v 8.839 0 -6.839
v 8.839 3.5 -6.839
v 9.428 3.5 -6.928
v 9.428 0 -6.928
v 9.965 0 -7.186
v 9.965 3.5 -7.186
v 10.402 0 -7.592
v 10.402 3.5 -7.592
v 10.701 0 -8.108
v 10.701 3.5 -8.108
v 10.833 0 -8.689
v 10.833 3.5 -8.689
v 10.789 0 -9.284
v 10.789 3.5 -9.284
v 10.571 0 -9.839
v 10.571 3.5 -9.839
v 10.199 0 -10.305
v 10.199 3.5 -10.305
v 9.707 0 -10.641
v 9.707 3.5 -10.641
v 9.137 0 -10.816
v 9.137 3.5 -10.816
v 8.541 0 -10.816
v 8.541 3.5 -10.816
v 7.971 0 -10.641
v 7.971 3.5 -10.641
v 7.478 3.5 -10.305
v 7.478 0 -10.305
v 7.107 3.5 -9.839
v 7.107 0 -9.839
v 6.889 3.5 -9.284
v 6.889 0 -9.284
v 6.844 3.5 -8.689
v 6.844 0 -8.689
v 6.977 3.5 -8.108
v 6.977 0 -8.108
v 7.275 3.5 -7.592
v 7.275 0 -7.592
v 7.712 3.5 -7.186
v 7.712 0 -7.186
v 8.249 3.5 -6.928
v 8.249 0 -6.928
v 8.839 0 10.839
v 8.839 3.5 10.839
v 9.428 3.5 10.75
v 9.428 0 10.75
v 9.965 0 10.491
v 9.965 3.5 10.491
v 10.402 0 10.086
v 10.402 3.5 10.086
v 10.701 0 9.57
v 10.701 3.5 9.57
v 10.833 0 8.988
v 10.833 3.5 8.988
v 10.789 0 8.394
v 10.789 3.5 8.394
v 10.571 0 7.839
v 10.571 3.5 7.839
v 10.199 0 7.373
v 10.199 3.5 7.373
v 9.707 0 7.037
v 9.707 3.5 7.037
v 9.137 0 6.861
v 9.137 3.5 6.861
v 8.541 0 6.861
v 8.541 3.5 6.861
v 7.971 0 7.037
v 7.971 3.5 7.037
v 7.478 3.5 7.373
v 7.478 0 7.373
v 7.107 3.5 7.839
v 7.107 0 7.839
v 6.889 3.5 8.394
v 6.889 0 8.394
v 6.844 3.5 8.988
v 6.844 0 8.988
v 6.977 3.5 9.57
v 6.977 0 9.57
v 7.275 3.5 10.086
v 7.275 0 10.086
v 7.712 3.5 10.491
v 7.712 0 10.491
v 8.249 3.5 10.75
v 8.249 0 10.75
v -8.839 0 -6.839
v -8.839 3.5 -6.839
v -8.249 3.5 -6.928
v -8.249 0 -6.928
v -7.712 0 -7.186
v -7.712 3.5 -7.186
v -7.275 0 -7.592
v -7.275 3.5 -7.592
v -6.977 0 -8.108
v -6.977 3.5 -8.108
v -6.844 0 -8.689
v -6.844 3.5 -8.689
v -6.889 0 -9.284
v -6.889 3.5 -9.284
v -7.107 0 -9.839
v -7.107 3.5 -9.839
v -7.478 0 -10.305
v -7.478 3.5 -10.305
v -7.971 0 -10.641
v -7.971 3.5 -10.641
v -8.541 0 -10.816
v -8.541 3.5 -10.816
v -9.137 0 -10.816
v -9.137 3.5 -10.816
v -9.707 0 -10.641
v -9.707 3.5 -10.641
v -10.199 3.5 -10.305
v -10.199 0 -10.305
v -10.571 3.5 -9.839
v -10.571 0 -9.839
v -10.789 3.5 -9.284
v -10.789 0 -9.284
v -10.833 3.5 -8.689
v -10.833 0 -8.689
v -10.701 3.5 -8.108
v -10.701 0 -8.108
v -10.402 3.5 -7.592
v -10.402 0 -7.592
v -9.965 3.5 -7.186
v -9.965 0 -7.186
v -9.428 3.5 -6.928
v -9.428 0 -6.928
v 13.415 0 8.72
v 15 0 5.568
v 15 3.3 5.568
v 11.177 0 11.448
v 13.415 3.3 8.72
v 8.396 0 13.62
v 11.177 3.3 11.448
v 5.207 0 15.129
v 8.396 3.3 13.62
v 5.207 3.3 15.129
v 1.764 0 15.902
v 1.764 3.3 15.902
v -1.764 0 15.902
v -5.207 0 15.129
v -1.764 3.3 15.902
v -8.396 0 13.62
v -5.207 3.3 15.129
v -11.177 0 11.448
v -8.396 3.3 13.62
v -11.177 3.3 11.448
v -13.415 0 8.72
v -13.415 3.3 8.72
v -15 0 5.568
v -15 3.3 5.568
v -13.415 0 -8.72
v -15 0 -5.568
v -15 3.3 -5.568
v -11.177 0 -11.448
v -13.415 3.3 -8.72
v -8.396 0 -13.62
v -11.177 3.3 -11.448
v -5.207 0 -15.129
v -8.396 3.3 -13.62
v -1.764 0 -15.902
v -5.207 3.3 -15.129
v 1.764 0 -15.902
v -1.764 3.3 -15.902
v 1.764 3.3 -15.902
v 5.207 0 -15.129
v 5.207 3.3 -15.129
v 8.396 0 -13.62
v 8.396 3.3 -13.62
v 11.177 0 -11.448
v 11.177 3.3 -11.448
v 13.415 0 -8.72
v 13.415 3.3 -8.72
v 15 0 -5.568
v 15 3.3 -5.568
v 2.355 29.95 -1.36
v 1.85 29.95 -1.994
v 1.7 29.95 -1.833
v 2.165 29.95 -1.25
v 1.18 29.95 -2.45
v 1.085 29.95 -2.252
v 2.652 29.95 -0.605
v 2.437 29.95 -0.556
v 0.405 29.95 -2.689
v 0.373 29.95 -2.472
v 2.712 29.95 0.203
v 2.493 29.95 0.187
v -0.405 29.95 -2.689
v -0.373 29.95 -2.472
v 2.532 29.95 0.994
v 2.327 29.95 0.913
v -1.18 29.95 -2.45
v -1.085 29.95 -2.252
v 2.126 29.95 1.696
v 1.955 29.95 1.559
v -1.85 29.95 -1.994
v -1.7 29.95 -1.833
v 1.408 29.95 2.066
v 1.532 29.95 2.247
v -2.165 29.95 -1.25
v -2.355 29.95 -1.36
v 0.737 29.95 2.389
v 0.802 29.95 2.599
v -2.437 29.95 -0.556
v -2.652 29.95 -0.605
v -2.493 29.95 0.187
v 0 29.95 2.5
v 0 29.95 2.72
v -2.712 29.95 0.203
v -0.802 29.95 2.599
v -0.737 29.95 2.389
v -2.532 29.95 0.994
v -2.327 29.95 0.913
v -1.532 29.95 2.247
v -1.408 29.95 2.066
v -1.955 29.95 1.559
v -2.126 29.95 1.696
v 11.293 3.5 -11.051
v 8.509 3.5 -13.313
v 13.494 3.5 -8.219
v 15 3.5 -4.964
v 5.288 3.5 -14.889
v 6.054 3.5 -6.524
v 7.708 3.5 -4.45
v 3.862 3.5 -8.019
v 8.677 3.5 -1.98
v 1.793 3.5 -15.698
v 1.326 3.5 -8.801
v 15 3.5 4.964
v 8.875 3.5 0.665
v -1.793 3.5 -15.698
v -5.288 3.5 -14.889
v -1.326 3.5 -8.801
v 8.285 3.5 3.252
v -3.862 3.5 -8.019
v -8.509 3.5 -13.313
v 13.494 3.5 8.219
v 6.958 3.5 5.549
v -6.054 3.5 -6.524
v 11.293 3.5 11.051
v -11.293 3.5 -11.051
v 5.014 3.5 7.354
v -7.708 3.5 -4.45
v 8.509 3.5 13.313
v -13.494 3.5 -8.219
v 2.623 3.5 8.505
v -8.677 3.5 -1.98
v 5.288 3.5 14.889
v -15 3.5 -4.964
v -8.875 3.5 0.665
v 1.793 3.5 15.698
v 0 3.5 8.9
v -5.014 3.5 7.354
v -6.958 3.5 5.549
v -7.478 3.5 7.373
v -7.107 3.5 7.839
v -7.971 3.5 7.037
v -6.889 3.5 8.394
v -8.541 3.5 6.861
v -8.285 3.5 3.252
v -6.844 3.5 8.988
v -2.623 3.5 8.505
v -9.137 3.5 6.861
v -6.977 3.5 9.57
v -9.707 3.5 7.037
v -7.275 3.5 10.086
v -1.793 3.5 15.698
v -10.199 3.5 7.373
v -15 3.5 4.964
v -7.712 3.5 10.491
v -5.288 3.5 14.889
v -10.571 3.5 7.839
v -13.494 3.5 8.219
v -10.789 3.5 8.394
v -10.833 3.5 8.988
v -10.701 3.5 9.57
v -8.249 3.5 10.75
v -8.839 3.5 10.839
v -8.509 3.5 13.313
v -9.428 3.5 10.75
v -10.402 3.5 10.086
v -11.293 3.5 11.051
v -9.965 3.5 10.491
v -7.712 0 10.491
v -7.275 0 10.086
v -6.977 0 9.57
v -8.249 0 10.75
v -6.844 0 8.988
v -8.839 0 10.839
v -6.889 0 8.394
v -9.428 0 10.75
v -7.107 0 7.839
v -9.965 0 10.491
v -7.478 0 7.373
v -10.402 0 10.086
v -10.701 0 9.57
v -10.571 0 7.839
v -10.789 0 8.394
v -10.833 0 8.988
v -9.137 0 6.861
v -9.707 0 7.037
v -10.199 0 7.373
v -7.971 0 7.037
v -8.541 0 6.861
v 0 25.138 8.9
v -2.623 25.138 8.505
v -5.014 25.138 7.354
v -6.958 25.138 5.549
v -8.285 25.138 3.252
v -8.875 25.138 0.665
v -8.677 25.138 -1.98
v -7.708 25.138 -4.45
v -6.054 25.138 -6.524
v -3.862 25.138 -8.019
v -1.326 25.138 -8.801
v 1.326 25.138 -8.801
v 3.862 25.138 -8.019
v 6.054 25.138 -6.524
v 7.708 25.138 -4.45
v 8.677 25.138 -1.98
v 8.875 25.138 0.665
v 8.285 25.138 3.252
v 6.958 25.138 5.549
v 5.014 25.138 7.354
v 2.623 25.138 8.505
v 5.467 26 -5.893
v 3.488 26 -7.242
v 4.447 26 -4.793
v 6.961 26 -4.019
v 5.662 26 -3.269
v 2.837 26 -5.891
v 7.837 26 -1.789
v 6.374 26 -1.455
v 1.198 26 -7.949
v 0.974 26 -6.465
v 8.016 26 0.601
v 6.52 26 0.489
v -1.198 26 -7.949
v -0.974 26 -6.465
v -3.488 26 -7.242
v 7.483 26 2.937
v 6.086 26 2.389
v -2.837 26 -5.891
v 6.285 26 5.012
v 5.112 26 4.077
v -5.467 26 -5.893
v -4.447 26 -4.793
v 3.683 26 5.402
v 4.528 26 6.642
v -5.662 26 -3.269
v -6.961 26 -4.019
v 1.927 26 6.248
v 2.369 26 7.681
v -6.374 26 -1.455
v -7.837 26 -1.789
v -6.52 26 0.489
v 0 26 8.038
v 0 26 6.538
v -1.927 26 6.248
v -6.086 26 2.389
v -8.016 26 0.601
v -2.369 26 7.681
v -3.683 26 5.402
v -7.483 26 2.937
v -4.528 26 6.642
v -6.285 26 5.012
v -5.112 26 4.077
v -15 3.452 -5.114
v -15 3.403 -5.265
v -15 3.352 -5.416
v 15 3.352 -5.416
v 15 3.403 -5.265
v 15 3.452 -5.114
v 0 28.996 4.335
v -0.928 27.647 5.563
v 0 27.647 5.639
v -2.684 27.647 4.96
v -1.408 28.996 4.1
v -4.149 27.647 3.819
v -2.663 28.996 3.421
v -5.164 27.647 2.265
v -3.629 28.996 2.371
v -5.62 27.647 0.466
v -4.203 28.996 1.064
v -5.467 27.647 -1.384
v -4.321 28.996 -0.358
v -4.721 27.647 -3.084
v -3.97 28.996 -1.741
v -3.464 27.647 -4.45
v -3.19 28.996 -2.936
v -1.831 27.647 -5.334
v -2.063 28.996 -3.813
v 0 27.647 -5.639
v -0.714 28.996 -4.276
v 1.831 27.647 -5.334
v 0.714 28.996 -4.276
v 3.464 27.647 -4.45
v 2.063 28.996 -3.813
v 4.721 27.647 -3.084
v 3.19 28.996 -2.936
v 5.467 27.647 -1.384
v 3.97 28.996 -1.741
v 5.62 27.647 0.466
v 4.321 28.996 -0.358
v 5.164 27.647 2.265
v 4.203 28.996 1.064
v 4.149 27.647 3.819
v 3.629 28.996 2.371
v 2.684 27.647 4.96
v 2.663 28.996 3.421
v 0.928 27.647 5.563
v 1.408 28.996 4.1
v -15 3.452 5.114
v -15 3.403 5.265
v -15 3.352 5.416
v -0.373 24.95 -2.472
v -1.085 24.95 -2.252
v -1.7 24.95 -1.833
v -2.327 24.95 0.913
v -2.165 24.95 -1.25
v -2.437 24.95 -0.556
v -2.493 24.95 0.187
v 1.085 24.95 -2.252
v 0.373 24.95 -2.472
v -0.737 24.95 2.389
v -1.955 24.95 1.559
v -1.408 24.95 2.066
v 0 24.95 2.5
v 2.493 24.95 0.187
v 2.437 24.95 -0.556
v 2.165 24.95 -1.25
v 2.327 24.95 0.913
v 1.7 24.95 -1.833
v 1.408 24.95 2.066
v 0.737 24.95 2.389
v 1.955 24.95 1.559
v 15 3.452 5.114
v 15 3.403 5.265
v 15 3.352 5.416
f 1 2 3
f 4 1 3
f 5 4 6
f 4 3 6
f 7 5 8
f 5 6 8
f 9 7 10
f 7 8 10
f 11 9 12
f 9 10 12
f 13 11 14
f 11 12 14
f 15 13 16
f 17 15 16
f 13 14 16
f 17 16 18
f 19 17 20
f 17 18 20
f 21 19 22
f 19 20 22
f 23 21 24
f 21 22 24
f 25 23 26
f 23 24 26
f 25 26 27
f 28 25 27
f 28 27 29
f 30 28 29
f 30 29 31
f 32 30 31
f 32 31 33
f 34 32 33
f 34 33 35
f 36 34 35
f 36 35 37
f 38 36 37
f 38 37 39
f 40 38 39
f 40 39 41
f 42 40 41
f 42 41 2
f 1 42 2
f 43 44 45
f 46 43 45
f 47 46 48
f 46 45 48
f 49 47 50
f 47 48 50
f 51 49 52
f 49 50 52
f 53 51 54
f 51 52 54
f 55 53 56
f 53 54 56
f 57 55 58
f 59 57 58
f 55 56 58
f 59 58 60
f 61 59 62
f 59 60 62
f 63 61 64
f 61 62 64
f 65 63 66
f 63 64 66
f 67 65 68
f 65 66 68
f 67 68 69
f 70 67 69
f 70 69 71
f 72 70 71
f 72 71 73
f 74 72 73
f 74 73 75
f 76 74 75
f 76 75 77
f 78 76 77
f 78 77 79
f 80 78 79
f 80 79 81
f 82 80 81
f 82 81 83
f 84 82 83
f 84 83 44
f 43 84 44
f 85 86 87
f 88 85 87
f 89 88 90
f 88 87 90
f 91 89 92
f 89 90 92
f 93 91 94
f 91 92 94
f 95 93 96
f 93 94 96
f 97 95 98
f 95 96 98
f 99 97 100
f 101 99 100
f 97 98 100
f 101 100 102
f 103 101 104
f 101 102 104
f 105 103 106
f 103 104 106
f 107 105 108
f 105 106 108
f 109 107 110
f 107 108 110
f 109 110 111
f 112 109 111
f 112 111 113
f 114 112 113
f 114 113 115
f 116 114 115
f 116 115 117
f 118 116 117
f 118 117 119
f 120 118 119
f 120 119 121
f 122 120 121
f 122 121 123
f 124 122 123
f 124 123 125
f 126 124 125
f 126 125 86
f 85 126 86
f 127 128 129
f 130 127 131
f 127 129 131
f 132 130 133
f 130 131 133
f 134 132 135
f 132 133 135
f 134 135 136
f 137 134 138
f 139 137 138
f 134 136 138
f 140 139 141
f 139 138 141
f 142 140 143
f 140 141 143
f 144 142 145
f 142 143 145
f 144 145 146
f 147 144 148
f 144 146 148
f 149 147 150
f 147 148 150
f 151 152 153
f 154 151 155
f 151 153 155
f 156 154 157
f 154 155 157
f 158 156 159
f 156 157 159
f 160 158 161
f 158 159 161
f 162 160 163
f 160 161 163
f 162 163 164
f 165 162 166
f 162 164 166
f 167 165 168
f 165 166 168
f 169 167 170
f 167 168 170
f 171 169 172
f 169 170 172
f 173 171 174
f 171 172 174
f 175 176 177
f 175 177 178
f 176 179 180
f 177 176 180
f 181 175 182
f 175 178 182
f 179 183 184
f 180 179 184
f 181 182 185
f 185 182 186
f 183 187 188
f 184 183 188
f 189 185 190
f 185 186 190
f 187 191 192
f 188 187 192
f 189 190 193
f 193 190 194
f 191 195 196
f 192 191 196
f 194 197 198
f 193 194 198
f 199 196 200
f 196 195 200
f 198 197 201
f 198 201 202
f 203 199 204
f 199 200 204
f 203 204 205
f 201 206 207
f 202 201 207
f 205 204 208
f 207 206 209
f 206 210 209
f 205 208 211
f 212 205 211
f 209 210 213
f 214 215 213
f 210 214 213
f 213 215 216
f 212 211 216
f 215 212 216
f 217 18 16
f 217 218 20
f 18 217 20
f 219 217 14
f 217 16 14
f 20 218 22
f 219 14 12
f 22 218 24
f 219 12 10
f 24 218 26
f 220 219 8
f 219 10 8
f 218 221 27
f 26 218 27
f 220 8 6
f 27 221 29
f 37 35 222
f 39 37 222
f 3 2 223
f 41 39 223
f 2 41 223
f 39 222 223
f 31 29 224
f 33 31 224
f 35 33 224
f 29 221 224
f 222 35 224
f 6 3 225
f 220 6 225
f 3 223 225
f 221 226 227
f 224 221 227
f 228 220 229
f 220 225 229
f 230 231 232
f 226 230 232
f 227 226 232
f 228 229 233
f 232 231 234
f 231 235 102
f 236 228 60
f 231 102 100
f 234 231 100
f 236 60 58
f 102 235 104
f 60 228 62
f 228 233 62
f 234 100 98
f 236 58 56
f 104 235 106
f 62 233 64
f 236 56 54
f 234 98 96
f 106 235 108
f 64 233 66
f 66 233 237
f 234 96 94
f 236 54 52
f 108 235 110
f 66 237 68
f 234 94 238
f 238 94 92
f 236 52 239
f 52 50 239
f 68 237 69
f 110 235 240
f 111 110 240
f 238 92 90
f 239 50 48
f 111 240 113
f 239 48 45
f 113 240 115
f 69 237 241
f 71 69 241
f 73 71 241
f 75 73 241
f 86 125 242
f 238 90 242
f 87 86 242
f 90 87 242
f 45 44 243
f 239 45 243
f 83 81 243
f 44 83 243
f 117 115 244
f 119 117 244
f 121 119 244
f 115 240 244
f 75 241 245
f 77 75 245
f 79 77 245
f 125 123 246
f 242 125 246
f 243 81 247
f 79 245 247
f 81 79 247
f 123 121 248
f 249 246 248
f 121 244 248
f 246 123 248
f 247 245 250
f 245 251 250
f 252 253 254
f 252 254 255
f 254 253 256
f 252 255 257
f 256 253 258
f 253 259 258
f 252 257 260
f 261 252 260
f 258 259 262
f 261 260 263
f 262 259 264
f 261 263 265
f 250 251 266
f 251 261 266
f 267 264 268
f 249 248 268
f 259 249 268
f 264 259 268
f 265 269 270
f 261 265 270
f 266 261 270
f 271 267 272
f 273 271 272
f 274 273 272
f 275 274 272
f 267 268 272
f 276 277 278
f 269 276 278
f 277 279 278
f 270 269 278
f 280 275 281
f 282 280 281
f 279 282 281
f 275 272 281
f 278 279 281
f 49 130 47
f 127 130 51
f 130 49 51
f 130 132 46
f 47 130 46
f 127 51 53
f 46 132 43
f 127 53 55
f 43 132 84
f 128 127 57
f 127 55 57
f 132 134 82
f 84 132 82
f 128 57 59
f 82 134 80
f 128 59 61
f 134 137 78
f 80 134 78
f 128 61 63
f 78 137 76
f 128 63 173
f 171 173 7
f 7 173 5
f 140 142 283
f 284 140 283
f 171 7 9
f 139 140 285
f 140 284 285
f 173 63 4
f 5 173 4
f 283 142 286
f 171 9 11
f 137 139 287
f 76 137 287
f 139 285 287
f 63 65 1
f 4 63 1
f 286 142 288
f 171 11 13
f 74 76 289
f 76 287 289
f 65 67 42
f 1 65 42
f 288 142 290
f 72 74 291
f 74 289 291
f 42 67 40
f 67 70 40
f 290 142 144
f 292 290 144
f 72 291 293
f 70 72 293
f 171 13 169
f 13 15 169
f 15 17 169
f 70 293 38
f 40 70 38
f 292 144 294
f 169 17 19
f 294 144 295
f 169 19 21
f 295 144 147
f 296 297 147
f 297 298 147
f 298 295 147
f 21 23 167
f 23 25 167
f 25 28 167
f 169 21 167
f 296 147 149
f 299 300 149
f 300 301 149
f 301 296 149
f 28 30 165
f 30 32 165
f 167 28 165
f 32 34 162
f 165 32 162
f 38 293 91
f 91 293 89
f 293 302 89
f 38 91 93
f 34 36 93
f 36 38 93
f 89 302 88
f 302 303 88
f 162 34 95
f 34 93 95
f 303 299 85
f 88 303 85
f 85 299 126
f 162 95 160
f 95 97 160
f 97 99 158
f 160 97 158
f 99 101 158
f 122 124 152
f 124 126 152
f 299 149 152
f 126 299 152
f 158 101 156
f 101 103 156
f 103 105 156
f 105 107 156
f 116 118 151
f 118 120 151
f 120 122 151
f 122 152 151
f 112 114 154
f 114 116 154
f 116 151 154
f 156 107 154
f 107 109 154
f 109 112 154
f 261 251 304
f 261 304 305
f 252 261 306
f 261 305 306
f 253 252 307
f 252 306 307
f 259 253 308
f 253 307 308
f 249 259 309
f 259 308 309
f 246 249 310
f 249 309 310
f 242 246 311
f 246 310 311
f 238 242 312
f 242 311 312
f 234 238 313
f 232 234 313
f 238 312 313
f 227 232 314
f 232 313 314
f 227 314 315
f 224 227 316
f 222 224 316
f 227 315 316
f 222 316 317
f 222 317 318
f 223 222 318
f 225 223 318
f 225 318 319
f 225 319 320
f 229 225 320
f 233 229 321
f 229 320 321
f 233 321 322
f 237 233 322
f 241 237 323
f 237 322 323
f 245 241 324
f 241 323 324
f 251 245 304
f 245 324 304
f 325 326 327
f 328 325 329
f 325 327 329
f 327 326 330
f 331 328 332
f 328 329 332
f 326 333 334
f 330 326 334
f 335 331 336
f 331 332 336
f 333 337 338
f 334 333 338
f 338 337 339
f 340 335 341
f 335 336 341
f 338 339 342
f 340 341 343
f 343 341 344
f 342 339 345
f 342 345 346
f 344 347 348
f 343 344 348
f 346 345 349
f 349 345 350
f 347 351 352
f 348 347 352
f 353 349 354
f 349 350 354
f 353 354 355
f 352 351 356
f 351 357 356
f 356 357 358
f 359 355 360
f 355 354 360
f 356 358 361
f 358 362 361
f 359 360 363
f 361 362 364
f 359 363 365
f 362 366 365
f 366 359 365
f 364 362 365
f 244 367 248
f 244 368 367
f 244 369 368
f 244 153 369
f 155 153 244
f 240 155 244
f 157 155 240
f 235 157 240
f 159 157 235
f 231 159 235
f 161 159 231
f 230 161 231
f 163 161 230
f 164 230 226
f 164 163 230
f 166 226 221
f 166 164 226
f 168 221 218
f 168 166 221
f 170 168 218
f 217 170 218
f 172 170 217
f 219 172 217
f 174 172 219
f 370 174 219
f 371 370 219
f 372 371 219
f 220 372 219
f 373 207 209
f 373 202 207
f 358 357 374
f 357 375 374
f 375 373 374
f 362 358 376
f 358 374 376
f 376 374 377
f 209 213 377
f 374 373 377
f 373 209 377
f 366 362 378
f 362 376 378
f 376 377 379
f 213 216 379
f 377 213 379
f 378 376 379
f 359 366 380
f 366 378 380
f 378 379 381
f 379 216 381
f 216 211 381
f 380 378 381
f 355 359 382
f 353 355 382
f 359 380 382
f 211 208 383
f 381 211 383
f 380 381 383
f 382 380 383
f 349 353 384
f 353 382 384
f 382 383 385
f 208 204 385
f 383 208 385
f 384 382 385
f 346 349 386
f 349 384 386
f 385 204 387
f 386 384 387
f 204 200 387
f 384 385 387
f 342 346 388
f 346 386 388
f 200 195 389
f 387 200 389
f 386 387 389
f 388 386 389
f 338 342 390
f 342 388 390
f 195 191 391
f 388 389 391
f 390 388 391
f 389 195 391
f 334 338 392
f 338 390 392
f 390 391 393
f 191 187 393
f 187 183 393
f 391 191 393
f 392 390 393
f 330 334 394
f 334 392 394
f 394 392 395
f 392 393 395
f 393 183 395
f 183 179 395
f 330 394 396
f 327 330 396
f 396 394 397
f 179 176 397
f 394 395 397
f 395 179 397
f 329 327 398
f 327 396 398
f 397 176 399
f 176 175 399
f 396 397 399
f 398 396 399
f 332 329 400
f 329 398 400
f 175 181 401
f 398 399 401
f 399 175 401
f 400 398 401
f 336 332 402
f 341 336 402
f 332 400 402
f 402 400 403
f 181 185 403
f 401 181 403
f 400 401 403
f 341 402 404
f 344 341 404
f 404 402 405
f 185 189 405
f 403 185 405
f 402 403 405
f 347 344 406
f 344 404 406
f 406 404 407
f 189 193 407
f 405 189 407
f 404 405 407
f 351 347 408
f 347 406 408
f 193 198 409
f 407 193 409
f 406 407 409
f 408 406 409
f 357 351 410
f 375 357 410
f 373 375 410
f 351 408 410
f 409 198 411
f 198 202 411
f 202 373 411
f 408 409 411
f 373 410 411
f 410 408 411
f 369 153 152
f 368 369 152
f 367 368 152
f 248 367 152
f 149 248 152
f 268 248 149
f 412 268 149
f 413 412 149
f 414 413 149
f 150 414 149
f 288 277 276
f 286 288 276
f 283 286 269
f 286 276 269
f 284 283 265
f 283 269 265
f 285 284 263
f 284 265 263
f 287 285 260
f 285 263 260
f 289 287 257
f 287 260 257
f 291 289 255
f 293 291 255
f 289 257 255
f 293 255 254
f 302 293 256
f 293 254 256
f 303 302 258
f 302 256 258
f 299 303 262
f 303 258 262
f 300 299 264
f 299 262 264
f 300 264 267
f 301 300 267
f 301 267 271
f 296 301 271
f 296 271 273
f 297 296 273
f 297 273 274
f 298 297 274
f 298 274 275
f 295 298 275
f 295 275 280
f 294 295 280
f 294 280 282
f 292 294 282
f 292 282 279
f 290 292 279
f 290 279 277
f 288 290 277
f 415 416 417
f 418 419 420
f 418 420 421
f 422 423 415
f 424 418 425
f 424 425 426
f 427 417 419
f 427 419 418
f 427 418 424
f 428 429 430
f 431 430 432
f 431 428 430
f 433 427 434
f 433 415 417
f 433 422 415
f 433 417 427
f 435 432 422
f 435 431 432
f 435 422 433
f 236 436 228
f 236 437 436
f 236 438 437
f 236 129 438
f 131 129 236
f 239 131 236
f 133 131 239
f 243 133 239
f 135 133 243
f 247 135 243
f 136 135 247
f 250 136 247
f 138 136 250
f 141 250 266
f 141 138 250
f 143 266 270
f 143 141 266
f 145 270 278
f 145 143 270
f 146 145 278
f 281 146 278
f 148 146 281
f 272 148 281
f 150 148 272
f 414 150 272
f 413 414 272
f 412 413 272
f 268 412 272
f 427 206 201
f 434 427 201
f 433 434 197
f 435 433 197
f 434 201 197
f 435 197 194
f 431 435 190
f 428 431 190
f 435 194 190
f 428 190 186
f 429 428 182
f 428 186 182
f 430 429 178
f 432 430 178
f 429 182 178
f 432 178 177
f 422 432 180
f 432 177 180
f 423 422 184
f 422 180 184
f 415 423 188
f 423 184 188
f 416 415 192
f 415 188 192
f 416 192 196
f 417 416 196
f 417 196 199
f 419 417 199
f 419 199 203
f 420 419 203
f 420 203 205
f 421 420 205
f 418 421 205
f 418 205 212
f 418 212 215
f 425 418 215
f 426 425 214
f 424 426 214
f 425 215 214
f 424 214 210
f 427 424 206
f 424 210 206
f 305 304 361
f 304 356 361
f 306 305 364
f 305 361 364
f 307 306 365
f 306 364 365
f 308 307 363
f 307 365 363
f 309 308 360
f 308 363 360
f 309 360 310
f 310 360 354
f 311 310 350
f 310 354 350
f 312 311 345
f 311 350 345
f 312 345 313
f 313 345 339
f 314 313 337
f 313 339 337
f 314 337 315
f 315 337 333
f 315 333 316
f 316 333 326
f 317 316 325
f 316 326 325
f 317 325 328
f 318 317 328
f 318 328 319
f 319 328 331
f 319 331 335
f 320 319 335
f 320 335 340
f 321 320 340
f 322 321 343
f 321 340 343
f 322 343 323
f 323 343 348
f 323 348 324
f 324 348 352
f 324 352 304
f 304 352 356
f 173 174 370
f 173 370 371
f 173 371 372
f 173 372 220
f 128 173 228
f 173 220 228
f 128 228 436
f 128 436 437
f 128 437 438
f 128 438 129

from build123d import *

# Parameters (mm, degrees)
SKETCH_2_R          = 2.5
CUT_EXTRUDE_1_DEPTH = 5
SKETCH_3_R          = 2
CUT_EXTRUDE_2_DEPTH = 5
CHAMFER_1_SIZE      = 0.2


with BuildPart() as part:
    # 草图1 → 旋转1 (revolve)
    with BuildSketch(Plane.XY, mode=Mode.PRIVATE) as revolve_1_sk:
        with BuildLine():
            Line((0, 0), (16, 0))
            Line((16, 0), (16, 3.5))
            Line((16, 3.5), (8.9, 3.5))
            Line((8.9, 3.5), (8.9, 25.138348415))
            Line((8.9, 25.138348415), (8.038348415, 26))
            Line((8.038348415, 26), (6.538348415, 26))
            ThreePointArc((6.538348415, 26), (5.032803689, 28.365273582), (2.719834554, 29.95))
            Line((2.719834554, 29.95), (0, 29.95))
            Line((0, 29.95), (0, 0))
        make_face()
    revolve(revolve_1_sk.sketch.rotate(Axis((0, 33.582842794, 0), (0, -1, 0)), 90), axis=Axis((0, 33.582842794, 0), (0, -1, 0)))

    # 草图2 → 切除-拉伸1 (cut)
    with BuildSketch(Plane(origin=(0, 29.95, 0), x_dir=(1, 0, 0), z_dir=(0, 1, 0))):
        with Locations(Location((0, 0, 0), (0, 0, 270))):
            Circle(SKETCH_2_R)
    extrude(amount=-CUT_EXTRUDE_1_DEPTH, mode=Mode.SUBTRACT)

    # 草图3 → 切除-拉伸2 (cut)
    with BuildSketch(Plane(origin=(0, 3.5, 0), x_dir=(1, 0, 0), z_dir=(0, 1, 0))):
        with Locations(Location((8.838834765, 8.838834765, 0), (0, 0, 270))):
            Circle(SKETCH_3_R)
        with Locations(Location((8.838834765, -8.838834765, 0), (0, 0, 270))):
            Circle(SKETCH_3_R)
        with Locations(Location((-8.838834765, -8.838834765, 0), (0, 0, 270))):
            Circle(SKETCH_3_R)
        with Locations(Location((-8.838834765, 8.838834765, 0), (0, 0, 270))):
            Circle(SKETCH_3_R)
        with BuildLine():
            Line((-15, 5.567764363), (-15, -5.567764363))
            ThreePointArc((-15, -5.567764363), (-16, 0), (-15, 5.567764363))
        make_face()
        with BuildLine():
            Line((15, 5.567764363), (15, -5.567764363))
            ThreePointArc((15, -5.567764363), (16, 0), (15, 5.567764363))
        make_face()
    extrude(amount=-CUT_EXTRUDE_2_DEPTH, mode=Mode.SUBTRACT)

    # 倒角1
    chamfer_1_edges = [part.edges().sort_by_distance(p)[0] for p in [
        (0, 3.5, -16),
        (0, 3.5, 16),
    ]]
    chamfer(chamfer_1_edges, length=CHAMFER_1_SIZE)


solid = part.part
